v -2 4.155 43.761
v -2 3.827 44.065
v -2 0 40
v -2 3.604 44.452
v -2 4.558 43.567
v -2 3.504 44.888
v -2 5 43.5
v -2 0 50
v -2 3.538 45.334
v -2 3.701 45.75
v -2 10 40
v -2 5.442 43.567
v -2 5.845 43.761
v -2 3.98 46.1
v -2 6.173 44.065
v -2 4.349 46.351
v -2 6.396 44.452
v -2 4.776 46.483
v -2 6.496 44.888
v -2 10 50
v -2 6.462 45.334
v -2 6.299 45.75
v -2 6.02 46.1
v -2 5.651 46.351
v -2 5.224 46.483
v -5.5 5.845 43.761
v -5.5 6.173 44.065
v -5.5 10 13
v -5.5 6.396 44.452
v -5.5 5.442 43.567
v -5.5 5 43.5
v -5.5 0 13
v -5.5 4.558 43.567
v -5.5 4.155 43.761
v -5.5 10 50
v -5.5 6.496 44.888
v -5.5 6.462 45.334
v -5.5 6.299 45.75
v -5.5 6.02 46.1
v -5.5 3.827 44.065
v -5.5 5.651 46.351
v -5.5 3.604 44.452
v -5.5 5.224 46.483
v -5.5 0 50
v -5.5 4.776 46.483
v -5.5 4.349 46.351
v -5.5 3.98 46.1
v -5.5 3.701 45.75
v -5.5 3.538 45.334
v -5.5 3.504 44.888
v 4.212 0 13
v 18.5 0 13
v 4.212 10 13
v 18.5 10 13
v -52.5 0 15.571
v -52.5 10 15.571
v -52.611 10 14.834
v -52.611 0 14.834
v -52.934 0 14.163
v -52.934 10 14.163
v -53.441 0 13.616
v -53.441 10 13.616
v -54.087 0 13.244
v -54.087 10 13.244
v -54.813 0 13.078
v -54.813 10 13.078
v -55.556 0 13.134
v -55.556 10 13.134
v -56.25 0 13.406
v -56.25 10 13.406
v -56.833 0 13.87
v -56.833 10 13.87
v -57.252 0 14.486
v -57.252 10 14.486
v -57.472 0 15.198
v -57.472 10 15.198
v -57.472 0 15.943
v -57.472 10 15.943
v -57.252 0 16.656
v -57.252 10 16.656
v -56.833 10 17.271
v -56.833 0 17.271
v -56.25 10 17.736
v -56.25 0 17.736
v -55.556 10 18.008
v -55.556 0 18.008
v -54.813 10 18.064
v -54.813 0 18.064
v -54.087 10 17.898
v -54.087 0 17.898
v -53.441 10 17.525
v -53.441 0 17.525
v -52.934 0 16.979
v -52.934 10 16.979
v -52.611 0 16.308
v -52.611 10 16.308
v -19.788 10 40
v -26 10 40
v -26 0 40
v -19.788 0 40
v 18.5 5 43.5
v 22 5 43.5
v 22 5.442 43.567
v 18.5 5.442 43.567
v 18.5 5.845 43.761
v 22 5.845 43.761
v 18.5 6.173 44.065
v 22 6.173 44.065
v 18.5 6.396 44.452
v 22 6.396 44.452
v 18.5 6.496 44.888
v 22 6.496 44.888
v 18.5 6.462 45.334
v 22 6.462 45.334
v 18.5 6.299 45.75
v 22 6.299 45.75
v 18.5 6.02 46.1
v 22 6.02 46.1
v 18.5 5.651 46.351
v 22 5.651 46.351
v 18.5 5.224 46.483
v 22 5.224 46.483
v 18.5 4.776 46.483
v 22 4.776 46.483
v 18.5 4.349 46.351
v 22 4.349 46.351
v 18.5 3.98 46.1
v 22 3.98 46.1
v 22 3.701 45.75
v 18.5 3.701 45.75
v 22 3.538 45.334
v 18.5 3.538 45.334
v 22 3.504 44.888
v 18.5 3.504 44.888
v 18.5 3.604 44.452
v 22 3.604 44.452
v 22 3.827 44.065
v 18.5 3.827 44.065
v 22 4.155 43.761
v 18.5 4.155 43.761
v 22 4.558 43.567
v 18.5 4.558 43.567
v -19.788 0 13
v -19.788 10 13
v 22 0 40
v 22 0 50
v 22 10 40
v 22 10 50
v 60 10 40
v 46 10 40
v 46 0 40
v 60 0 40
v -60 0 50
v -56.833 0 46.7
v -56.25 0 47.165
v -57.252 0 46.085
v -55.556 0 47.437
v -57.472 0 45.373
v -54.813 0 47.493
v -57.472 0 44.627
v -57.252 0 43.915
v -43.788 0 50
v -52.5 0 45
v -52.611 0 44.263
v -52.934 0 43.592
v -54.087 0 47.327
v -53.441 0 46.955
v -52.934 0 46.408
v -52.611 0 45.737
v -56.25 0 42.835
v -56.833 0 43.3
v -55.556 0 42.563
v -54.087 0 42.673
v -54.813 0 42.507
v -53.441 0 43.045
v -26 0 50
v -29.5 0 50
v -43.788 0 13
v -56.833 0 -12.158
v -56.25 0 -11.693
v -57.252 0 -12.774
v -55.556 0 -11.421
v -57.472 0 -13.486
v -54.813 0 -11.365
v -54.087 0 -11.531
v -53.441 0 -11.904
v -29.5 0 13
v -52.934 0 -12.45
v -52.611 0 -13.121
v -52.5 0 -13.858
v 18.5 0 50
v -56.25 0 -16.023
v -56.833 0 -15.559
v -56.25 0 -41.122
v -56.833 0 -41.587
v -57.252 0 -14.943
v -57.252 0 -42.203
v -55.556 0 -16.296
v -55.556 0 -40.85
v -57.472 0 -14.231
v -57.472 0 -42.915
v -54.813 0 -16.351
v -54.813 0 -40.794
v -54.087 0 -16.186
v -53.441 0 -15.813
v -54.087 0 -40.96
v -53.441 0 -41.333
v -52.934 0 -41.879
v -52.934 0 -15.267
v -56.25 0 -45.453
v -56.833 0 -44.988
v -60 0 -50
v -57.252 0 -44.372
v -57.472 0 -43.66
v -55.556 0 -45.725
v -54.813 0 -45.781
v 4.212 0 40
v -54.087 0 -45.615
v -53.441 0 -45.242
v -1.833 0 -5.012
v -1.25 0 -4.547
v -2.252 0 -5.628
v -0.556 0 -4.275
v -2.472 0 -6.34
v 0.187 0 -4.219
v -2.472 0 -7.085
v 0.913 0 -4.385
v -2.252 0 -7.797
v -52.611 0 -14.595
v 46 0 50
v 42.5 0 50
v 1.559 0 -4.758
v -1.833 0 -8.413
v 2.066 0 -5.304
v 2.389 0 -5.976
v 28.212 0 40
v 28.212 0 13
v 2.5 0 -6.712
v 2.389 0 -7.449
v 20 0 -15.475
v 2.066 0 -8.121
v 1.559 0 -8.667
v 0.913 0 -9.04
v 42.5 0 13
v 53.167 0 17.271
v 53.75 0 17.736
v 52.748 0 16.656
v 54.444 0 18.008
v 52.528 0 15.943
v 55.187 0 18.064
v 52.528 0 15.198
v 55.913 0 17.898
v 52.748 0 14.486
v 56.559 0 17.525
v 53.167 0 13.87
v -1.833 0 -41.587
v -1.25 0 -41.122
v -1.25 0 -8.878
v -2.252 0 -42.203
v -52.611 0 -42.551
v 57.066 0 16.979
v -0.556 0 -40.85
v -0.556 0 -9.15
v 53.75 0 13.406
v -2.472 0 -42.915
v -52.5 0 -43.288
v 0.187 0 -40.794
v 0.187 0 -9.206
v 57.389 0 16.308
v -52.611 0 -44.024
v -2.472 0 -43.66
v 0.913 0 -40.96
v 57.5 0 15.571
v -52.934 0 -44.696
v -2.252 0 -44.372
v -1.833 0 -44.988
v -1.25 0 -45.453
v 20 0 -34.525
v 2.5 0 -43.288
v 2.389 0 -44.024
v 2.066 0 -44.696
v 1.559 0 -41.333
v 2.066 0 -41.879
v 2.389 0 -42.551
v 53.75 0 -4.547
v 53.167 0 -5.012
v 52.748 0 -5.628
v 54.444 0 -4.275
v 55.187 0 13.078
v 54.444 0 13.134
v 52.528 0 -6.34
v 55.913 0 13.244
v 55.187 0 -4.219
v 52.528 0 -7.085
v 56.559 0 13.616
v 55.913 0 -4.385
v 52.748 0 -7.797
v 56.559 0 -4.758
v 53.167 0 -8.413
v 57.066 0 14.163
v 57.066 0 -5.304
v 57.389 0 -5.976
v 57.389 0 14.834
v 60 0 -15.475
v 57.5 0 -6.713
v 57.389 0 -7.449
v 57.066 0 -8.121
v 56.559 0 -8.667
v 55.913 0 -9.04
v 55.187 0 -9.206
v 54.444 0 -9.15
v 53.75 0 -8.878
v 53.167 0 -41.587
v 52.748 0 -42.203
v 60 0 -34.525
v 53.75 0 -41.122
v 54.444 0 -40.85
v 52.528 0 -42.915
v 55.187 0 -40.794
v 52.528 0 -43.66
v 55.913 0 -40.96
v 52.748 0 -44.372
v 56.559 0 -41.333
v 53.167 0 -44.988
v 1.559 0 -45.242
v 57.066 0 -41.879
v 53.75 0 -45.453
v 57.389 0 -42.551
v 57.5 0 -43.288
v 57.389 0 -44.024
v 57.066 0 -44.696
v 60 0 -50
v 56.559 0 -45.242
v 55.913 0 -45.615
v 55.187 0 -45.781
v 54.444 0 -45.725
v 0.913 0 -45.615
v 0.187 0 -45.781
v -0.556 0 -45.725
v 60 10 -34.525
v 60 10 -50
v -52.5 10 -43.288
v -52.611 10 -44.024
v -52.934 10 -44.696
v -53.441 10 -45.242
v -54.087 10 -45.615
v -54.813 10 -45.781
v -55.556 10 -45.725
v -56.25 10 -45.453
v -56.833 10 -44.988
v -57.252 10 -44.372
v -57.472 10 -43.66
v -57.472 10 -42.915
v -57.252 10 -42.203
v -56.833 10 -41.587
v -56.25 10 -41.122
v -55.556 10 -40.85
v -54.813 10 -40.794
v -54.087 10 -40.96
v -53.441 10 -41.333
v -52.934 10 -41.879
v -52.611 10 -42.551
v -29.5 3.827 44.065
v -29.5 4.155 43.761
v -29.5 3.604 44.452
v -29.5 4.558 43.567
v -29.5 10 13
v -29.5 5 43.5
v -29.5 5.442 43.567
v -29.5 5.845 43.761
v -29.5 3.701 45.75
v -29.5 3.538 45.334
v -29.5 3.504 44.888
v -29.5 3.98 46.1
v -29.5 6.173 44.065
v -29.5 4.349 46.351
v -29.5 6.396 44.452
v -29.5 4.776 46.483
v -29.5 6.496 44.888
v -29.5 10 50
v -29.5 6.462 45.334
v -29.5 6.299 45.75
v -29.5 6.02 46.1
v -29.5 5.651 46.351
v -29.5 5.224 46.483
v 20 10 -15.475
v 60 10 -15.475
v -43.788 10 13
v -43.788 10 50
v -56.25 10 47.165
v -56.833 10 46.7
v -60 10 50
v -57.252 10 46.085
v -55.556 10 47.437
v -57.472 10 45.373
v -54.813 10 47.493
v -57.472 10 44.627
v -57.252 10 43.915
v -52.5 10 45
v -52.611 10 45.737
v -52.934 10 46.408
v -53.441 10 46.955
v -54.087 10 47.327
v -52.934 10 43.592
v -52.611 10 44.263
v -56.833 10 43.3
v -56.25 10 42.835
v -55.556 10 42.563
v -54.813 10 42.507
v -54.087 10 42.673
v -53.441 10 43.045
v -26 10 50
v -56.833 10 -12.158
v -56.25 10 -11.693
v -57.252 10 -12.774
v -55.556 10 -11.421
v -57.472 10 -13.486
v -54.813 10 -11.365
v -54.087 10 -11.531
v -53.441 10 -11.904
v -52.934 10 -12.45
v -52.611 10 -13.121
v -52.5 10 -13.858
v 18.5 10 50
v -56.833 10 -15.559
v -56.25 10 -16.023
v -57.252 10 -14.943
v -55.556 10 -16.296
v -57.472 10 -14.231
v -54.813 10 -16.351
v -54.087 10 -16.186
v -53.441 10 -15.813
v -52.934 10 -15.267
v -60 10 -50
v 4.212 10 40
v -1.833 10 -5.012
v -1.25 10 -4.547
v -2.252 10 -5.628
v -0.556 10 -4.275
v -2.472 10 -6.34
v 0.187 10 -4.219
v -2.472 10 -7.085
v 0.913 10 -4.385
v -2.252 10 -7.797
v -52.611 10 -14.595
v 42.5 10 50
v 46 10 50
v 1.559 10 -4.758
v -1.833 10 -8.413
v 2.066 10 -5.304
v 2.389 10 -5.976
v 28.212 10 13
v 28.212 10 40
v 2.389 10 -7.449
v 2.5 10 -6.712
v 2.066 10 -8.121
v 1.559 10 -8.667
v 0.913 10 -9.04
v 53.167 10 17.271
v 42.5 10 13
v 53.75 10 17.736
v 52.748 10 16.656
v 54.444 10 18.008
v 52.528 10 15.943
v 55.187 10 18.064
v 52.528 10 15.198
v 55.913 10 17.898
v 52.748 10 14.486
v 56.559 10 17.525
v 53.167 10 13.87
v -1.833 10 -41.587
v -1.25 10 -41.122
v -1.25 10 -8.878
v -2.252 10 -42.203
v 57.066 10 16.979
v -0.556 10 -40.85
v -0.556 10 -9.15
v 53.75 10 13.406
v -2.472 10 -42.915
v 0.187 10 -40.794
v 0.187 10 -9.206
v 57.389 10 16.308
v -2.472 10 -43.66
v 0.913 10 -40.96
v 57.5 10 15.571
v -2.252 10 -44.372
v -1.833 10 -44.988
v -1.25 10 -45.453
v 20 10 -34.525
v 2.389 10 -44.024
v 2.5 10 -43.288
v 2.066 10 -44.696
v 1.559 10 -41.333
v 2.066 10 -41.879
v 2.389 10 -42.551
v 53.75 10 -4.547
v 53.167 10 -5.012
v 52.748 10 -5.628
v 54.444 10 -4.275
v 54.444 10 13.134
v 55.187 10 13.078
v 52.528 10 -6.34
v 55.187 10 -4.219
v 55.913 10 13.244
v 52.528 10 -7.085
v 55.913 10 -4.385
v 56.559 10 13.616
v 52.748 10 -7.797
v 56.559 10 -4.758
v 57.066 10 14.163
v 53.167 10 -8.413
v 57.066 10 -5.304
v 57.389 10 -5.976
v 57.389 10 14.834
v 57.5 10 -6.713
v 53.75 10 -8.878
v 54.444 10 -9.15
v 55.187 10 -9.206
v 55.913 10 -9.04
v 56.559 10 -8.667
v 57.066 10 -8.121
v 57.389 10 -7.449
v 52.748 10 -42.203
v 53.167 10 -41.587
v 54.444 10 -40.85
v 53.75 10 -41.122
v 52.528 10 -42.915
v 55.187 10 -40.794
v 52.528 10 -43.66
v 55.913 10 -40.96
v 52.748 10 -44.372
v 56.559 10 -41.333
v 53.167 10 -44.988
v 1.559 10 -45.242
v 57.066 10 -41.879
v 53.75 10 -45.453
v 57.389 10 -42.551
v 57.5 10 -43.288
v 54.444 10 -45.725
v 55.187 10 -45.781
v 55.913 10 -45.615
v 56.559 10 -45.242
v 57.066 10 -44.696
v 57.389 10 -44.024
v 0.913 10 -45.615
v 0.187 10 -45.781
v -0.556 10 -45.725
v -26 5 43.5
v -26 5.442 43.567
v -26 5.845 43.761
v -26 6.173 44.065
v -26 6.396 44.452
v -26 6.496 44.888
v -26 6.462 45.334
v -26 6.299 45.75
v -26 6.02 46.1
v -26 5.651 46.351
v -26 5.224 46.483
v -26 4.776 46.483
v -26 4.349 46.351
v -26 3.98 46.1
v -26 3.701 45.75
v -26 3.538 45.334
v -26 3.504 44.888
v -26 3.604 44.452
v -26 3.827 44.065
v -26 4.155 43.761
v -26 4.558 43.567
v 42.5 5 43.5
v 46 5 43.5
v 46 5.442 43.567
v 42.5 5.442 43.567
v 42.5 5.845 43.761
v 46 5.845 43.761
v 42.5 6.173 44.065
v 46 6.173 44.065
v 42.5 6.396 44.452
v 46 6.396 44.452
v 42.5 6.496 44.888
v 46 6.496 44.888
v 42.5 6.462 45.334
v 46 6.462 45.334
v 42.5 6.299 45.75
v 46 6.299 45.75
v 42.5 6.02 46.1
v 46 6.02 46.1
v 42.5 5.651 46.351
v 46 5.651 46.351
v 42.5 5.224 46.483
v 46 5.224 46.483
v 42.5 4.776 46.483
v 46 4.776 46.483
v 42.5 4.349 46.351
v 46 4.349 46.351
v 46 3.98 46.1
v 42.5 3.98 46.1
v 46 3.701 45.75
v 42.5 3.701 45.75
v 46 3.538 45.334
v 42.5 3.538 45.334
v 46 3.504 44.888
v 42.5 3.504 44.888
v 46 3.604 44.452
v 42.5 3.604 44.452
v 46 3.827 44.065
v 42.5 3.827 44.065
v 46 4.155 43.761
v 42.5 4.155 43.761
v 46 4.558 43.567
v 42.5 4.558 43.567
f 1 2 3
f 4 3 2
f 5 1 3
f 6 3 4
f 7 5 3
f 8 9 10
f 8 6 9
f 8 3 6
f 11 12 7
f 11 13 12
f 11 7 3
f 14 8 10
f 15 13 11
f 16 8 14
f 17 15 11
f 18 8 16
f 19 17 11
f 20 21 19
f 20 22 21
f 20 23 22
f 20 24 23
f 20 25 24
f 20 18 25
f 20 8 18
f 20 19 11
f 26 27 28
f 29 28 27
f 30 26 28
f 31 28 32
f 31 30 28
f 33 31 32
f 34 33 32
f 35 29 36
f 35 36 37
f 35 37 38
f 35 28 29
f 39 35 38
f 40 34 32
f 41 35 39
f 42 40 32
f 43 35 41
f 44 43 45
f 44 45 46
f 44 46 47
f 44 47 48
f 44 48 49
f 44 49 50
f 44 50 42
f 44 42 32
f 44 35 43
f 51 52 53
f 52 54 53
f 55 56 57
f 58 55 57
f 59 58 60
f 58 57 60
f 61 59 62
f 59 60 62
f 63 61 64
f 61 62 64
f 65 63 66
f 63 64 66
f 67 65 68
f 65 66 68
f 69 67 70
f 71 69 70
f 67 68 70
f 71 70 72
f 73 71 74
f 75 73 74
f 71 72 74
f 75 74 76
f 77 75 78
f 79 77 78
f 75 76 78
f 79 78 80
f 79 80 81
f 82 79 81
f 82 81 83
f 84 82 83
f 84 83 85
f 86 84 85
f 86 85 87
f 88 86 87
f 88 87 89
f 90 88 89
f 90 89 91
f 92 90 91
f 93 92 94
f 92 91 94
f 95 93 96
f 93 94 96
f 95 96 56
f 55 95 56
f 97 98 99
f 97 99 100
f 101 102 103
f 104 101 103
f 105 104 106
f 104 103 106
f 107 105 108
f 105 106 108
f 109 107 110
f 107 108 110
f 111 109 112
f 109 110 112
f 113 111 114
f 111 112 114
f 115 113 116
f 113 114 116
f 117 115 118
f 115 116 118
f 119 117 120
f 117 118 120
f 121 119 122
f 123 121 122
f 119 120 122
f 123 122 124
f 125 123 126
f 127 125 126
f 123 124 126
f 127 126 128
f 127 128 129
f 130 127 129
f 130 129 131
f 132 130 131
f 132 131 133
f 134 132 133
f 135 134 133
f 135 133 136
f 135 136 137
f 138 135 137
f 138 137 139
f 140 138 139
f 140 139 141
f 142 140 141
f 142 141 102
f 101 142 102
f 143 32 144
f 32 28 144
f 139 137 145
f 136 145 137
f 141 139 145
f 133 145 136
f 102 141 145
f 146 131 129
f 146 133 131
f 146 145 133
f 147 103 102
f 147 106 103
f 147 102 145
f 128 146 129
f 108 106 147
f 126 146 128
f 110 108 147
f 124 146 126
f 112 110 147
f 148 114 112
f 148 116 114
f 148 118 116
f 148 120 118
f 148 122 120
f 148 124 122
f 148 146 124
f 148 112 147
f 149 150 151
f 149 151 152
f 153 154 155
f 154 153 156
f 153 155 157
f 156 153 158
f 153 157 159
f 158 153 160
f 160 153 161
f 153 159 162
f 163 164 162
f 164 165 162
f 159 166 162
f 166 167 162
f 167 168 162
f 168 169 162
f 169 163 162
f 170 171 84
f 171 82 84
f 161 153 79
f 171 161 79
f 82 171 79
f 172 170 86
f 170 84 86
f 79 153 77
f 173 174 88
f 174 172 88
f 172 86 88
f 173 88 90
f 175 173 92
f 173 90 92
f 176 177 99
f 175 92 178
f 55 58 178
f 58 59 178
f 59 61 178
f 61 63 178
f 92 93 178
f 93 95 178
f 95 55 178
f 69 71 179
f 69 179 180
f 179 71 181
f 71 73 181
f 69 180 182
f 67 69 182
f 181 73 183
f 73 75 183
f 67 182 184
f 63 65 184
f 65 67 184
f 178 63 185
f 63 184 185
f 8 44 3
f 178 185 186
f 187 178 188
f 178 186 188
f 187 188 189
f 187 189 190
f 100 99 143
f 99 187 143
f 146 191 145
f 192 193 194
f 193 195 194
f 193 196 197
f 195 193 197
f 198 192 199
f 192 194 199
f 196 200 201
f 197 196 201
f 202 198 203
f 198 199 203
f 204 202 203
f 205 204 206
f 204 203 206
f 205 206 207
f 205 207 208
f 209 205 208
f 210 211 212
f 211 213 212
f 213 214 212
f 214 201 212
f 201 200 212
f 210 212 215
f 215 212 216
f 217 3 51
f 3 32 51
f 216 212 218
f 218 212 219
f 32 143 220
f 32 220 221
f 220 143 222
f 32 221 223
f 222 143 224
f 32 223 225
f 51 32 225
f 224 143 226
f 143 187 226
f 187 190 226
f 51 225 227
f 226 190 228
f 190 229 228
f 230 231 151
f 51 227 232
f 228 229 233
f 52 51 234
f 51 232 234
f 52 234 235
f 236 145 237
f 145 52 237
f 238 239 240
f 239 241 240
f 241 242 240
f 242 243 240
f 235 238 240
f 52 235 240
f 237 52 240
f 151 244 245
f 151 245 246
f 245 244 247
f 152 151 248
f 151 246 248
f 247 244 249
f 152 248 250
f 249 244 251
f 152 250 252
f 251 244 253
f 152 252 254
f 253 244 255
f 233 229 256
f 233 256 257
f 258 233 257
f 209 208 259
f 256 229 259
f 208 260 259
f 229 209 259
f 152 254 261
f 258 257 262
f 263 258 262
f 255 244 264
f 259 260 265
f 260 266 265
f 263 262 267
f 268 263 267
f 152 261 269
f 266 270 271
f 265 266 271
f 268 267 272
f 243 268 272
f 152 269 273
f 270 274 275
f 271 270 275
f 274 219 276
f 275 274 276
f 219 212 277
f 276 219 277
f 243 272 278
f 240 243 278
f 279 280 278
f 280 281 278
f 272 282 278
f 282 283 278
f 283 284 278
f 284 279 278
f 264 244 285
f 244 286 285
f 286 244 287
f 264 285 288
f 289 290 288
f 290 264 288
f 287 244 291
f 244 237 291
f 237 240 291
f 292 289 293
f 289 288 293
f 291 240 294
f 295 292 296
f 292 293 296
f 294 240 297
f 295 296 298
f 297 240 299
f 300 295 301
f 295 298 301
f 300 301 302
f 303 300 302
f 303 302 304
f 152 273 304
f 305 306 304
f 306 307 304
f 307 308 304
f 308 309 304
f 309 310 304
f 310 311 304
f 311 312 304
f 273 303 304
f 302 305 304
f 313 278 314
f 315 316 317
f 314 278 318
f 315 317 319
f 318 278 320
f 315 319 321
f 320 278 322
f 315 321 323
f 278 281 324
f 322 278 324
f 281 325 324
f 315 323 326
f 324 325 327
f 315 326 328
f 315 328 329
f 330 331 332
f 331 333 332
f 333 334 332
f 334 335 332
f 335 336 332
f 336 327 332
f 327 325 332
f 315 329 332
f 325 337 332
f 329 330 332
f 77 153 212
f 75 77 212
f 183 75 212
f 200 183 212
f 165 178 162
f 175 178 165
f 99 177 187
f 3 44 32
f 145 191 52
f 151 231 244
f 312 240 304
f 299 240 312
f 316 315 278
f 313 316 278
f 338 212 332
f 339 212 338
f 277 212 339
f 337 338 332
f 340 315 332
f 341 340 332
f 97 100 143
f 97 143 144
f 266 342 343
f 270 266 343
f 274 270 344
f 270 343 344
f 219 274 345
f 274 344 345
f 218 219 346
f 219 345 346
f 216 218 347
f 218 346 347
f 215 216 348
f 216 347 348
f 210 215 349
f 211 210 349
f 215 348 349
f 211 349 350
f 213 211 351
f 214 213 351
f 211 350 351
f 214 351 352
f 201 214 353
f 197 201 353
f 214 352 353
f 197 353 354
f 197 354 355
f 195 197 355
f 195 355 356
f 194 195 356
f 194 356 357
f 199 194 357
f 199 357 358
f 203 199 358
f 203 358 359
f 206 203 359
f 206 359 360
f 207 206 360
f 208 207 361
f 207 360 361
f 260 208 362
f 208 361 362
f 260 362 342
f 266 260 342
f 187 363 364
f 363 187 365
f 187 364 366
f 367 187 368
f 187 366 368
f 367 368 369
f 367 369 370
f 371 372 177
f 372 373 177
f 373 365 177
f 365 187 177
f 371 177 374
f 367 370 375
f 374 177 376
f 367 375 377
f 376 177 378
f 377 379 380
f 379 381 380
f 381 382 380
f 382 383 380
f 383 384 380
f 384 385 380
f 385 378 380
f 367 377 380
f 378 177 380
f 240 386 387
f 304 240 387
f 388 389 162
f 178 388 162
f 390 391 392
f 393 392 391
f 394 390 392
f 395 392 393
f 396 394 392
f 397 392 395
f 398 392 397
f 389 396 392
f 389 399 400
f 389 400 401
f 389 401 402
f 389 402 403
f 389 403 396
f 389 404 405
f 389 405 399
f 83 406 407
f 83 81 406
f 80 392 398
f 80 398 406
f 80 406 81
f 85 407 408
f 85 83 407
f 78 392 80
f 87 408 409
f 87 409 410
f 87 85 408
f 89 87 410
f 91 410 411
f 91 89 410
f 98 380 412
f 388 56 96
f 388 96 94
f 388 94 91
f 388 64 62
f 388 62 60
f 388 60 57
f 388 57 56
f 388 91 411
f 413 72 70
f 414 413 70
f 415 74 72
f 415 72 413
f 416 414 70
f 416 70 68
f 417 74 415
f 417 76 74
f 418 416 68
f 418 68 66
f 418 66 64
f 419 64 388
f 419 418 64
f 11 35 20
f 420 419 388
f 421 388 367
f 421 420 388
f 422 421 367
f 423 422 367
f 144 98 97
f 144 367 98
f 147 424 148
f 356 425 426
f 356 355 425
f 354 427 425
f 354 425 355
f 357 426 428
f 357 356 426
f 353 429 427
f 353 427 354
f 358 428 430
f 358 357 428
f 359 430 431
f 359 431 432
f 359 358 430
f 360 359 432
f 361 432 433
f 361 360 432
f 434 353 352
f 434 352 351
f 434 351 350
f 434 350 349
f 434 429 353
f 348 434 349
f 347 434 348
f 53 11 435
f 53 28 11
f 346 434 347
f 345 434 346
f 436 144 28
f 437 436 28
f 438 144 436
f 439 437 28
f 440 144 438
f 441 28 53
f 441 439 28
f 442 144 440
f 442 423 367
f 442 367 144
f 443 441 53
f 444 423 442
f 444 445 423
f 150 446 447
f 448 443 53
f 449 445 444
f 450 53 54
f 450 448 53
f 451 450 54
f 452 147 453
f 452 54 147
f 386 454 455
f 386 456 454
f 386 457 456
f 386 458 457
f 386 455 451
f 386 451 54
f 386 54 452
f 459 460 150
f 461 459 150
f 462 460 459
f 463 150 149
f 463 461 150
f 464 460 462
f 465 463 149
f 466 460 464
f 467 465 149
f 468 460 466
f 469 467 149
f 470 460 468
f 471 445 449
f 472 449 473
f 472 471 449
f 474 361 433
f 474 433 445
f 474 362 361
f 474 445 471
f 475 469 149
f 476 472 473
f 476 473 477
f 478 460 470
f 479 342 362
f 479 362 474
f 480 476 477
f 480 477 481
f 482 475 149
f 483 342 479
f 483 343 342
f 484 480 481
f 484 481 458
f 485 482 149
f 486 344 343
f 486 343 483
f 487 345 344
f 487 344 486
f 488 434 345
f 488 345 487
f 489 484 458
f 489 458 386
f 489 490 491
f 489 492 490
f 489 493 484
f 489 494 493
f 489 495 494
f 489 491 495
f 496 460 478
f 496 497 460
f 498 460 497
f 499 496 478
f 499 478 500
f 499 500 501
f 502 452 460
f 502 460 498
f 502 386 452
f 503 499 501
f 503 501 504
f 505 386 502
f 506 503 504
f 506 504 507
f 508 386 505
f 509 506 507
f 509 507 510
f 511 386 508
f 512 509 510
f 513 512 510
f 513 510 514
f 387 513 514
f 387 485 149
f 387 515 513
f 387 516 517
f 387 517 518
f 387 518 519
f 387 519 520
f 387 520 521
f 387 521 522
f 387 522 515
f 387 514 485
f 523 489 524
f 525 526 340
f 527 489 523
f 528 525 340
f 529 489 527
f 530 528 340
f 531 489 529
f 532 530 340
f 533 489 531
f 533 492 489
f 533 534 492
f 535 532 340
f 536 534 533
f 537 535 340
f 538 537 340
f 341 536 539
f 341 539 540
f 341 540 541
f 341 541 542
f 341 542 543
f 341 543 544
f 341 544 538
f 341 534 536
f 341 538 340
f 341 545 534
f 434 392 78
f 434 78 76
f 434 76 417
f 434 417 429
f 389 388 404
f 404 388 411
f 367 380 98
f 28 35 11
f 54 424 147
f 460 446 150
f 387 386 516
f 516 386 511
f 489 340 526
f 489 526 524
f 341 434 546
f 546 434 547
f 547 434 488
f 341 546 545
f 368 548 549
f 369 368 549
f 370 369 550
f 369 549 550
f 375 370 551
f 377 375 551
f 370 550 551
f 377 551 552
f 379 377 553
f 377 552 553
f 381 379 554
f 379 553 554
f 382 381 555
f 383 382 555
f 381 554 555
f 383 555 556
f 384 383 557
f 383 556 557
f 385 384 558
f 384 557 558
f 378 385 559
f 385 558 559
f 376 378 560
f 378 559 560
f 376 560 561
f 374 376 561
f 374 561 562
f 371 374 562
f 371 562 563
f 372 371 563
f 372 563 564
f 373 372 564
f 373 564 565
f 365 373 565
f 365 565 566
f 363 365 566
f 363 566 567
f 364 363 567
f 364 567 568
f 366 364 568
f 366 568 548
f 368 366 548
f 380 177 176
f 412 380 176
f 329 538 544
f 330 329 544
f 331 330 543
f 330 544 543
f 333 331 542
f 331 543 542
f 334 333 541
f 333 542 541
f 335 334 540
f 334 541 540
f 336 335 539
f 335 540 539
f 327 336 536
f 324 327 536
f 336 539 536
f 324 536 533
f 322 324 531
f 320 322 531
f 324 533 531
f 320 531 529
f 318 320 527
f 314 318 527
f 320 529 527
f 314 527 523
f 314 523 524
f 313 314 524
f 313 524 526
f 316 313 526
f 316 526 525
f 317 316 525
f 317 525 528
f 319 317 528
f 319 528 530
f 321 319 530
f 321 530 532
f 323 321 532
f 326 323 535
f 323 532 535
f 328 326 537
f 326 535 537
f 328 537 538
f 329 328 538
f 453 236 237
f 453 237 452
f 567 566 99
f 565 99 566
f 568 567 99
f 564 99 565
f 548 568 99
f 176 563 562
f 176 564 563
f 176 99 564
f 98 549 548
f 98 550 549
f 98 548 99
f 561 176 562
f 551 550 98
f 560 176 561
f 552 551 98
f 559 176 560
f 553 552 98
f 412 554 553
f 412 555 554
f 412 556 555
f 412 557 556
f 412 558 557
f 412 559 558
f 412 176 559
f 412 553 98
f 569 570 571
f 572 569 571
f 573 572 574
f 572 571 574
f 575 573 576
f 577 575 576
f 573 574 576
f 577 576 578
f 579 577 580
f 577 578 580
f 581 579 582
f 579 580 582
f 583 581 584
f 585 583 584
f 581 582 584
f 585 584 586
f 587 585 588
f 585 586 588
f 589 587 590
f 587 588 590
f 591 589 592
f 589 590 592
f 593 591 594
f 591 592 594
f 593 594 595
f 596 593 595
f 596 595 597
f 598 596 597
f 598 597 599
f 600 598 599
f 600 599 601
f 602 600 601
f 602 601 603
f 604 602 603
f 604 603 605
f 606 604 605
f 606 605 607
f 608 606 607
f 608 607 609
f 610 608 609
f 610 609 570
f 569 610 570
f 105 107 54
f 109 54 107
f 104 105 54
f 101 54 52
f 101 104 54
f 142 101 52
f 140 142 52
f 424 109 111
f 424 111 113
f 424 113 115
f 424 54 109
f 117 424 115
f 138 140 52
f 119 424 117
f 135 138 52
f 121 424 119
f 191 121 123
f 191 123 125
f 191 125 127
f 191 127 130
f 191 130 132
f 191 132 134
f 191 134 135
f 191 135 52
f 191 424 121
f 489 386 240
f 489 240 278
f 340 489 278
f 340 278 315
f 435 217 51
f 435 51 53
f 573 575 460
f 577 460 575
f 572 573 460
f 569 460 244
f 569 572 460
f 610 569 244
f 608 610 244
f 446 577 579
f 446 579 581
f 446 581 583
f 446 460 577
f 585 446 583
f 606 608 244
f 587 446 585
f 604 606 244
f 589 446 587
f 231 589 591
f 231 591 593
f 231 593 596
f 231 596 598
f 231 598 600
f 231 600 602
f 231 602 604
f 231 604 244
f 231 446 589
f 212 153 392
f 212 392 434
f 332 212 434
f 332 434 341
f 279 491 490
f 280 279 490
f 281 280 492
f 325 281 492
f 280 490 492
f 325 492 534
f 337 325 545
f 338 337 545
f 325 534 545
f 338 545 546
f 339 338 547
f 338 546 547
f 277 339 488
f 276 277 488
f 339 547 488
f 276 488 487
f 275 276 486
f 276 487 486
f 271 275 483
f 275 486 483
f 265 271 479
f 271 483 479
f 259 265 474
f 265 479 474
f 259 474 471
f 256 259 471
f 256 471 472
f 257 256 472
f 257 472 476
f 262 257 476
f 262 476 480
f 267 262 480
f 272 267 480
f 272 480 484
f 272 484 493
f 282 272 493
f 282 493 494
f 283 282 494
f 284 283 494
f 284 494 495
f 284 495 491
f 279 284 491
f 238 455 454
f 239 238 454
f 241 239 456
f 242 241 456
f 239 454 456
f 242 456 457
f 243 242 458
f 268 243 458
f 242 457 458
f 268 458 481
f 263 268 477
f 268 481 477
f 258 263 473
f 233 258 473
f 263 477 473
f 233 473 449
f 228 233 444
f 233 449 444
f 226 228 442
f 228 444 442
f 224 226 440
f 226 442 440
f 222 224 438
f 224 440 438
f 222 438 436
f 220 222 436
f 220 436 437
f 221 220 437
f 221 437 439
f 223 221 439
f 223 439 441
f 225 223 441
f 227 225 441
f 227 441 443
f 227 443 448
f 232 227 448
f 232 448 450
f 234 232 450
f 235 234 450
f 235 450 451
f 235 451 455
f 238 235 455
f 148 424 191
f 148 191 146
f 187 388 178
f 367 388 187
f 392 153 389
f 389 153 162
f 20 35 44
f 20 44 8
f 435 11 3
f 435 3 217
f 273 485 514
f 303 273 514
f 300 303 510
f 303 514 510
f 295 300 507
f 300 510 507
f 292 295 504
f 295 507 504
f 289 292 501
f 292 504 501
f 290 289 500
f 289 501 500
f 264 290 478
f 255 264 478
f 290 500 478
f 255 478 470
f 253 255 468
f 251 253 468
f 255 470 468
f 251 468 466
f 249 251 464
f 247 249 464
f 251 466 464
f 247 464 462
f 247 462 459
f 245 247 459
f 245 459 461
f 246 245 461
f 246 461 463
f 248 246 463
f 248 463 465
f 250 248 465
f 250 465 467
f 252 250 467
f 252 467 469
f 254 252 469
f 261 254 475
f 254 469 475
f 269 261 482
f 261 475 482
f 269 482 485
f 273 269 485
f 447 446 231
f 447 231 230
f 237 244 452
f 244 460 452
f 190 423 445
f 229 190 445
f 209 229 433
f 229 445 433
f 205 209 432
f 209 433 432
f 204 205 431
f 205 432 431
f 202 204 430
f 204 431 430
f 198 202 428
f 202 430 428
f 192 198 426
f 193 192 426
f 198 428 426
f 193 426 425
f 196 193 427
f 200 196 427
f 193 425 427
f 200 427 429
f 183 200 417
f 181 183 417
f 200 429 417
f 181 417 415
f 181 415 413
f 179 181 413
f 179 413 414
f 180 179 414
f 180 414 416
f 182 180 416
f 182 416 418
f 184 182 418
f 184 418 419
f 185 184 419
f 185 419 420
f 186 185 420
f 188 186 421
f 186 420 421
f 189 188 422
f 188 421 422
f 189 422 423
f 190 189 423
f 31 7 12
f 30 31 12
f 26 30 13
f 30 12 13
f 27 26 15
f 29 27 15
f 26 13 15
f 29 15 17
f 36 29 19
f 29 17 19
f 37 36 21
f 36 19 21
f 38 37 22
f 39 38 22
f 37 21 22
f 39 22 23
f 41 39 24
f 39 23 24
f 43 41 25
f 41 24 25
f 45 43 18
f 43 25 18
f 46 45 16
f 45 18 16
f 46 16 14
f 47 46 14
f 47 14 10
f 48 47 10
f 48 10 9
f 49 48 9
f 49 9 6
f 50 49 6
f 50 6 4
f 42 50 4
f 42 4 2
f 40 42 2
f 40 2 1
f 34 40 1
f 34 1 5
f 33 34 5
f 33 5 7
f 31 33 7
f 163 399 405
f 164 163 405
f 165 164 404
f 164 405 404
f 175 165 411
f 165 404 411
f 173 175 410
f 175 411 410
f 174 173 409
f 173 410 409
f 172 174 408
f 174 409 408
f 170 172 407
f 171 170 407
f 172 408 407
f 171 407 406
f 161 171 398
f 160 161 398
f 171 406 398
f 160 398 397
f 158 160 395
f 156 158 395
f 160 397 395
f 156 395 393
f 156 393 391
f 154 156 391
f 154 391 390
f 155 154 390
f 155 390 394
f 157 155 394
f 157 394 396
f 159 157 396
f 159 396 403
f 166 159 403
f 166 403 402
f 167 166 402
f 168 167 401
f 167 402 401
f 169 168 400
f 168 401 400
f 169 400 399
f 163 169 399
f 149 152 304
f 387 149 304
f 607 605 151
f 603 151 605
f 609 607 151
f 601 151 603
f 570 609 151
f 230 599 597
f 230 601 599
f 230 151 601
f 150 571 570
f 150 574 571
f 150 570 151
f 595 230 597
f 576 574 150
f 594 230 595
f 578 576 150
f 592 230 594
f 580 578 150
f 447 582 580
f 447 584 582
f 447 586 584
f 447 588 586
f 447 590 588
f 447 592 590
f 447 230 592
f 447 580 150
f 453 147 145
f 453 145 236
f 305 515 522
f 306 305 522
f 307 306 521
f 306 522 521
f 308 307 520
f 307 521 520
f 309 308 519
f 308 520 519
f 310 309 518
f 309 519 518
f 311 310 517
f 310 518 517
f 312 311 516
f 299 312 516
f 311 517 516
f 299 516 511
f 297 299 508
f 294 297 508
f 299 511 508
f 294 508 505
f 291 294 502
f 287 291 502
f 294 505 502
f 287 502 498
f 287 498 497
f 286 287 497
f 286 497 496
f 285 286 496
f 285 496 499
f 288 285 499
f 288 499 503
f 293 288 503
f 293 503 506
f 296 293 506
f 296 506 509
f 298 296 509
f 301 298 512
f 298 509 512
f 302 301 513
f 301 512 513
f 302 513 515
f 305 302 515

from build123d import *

# Parameters (mm, degrees)
SKETCH1_W                 = 120
SKETCH1_H                 = 100
BOSS_EXTRUDE1_DEPTH       = 10
CUT_EXTRUDE1_DEPTH        = 37
SKETCH3_W                 = 6.2125
SKETCH3_H                 = 10
SKETCH3_W_2               = 14
CUT_EXTRUDE2_DEPTH        = 10
SKETCH4_R                 = 1.5
CUT_EXTRUDE3_DEPTH        = 75.5
SKETCH7_R                 = 2.5
SKETCH7_W                 = 40
SKETCH7_H                 = 19.05
CUT_EXTRUDE4_DEPTH        = 20
SKETCH10_R                = 2.5
CUT_EXTRUDE5_DEPTH        = 10
F_5_0MM_DOWEL_HOLE1_D     = 5
F_5_0MM_DOWEL_HOLE1_DEPTH = 25
F_5_0MM_DOWEL_HOLE1_TIP   = 1.502151548


with BuildPart() as part:
    # Sketch1 → Boss-Extrude1 (new body)
    with BuildSketch(Plane(origin=(0, 0, 0), x_dir=(1, 0, 0), z_dir=(0, 1, 0))):
        Rectangle(SKETCH1_W, SKETCH1_H)
    extrude(amount=BOSS_EXTRUDE1_DEPTH)

    # Sketch2 → Cut-Extrude1 (cut)
    with BuildSketch(Plane.XY.offset(50)):
        Polygon((-42.5, 10), (-43.7875, 10), (-43.7875, -10), (-42.5, -10), (-29.5, -10), (-29.5, 10), align=None)
        Polygon((-5.5, -10), (-18.5, -10), (-19.7875, -10), (-19.7875, 10), (-18.5, 10), (-5.5, 10), align=None)
        Polygon((18.5, -10), (5.5, -10), (4.2125, -10), (4.2125, 10), (5.5, 10), (18.5, 10), align=None)
        Polygon((42.5, -10), (29.5, -10), (28.2125, -10), (28.2125, 10), (29.5, 10), (42.5, 10), align=None)
    extrude(amount=-CUT_EXTRUDE1_DEPTH, mode=Mode.SUBTRACT)

    # Sketch3 → Cut-Extrude2 (cut)
    with BuildSketch(Plane.XY.offset(50)):
        with Locations((-22.89375, 5)):
            Rectangle(SKETCH3_W, SKETCH3_H)
        with Locations((1.10625, 5)):
            Rectangle(SKETCH3_W, SKETCH3_H)
        with Locations((25.10625, 5)):
            Rectangle(SKETCH3_W, SKETCH3_H)
        with Locations((53, 5)):
            Rectangle(SKETCH3_W_2, SKETCH3_H)
    extrude(amount=-CUT_EXTRUDE2_DEPTH, mode=Mode.SUBTRACT)

    # Sketch4 → Cut-Extrude3 (cut)
    with BuildSketch(Plane(origin=(46, 0, 0), x_dir=(0, 0, -1), z_dir=(1, 0, 0))):
        with Locations((-45, 5)):
            Circle(SKETCH4_R)
    extrude(amount=-CUT_EXTRUDE3_DEPTH, mode=Mode.SUBTRACT)

    # Sketch7 → Cut-Extrude4 (cut)
    with BuildSketch(Plane(origin=(0, 10, 0), x_dir=(1, 0, 0), z_dir=(0, 1, 0))):
        with Locations((55, 6.7125)):
            Circle(SKETCH7_R)
        with Locations((55, 43.2875)):
            Circle(SKETCH7_R)
        with Locations((0, 43.2875)):
            Circle(SKETCH7_R)
        with Locations((0, 6.7125)):
            Circle(SKETCH7_R)
        with Locations((40, 25)):
            Rectangle(SKETCH7_W, SKETCH7_H)
    extrude(amount=-CUT_EXTRUDE4_DEPTH, mode=Mode.SUBTRACT)

    # Sketch10 → Cut-Extrude5 (cut)
    with BuildSketch(Plane(origin=(0, 10, 0), x_dir=(1, 0, 0), z_dir=(0, 1, 0))):
        with Locations((-55, 43.2875)):
            Circle(SKETCH10_R)
        with Locations((55, 43.2875)):
            Circle(SKETCH10_R)
        with Locations((55, 6.7125)):
            Circle(SKETCH10_R)
        with Locations((-55, 13.858333333)):
            Circle(SKETCH10_R)
        with Locations((-55, -15.570833333)):
            Circle(SKETCH10_R)
        with Locations((-55, -45)):
            Circle(SKETCH10_R)
        with Locations((55, -15.570833333)):
            Circle(SKETCH10_R)
    extrude(amount=-CUT_EXTRUDE5_DEPTH, mode=Mode.SUBTRACT)

    # Ø5.0mm Dowel Hole1
    with Locations(Plane(origin=(-676.293536786, 10, -1303.282701689), x_dir=(1, 0, 0), z_dir=(0, 1, 0))):
        with Locations((731.293536786, -1318.853535022), (621.293536786, -1318.853535022), (621.293536786, -1348.282701689), (621.293536786, -1259.995201689), (731.293536786, -1259.995201689), (731.293536786, -1296.570201689), (621.293536786, -1289.424368355)):
            Hole(F_5_0MM_DOWEL_HOLE1_D / 2, depth=F_5_0MM_DOWEL_HOLE1_DEPTH)
            with Locations((0, 0, -(F_5_0MM_DOWEL_HOLE1_DEPTH + F_5_0MM_DOWEL_HOLE1_TIP / 2))):  # 118° drill point
                Cone(0, F_5_0MM_DOWEL_HOLE1_D / 2, F_5_0MM_DOWEL_HOLE1_TIP, mode=Mode.SUBTRACT)


solid = part.part
